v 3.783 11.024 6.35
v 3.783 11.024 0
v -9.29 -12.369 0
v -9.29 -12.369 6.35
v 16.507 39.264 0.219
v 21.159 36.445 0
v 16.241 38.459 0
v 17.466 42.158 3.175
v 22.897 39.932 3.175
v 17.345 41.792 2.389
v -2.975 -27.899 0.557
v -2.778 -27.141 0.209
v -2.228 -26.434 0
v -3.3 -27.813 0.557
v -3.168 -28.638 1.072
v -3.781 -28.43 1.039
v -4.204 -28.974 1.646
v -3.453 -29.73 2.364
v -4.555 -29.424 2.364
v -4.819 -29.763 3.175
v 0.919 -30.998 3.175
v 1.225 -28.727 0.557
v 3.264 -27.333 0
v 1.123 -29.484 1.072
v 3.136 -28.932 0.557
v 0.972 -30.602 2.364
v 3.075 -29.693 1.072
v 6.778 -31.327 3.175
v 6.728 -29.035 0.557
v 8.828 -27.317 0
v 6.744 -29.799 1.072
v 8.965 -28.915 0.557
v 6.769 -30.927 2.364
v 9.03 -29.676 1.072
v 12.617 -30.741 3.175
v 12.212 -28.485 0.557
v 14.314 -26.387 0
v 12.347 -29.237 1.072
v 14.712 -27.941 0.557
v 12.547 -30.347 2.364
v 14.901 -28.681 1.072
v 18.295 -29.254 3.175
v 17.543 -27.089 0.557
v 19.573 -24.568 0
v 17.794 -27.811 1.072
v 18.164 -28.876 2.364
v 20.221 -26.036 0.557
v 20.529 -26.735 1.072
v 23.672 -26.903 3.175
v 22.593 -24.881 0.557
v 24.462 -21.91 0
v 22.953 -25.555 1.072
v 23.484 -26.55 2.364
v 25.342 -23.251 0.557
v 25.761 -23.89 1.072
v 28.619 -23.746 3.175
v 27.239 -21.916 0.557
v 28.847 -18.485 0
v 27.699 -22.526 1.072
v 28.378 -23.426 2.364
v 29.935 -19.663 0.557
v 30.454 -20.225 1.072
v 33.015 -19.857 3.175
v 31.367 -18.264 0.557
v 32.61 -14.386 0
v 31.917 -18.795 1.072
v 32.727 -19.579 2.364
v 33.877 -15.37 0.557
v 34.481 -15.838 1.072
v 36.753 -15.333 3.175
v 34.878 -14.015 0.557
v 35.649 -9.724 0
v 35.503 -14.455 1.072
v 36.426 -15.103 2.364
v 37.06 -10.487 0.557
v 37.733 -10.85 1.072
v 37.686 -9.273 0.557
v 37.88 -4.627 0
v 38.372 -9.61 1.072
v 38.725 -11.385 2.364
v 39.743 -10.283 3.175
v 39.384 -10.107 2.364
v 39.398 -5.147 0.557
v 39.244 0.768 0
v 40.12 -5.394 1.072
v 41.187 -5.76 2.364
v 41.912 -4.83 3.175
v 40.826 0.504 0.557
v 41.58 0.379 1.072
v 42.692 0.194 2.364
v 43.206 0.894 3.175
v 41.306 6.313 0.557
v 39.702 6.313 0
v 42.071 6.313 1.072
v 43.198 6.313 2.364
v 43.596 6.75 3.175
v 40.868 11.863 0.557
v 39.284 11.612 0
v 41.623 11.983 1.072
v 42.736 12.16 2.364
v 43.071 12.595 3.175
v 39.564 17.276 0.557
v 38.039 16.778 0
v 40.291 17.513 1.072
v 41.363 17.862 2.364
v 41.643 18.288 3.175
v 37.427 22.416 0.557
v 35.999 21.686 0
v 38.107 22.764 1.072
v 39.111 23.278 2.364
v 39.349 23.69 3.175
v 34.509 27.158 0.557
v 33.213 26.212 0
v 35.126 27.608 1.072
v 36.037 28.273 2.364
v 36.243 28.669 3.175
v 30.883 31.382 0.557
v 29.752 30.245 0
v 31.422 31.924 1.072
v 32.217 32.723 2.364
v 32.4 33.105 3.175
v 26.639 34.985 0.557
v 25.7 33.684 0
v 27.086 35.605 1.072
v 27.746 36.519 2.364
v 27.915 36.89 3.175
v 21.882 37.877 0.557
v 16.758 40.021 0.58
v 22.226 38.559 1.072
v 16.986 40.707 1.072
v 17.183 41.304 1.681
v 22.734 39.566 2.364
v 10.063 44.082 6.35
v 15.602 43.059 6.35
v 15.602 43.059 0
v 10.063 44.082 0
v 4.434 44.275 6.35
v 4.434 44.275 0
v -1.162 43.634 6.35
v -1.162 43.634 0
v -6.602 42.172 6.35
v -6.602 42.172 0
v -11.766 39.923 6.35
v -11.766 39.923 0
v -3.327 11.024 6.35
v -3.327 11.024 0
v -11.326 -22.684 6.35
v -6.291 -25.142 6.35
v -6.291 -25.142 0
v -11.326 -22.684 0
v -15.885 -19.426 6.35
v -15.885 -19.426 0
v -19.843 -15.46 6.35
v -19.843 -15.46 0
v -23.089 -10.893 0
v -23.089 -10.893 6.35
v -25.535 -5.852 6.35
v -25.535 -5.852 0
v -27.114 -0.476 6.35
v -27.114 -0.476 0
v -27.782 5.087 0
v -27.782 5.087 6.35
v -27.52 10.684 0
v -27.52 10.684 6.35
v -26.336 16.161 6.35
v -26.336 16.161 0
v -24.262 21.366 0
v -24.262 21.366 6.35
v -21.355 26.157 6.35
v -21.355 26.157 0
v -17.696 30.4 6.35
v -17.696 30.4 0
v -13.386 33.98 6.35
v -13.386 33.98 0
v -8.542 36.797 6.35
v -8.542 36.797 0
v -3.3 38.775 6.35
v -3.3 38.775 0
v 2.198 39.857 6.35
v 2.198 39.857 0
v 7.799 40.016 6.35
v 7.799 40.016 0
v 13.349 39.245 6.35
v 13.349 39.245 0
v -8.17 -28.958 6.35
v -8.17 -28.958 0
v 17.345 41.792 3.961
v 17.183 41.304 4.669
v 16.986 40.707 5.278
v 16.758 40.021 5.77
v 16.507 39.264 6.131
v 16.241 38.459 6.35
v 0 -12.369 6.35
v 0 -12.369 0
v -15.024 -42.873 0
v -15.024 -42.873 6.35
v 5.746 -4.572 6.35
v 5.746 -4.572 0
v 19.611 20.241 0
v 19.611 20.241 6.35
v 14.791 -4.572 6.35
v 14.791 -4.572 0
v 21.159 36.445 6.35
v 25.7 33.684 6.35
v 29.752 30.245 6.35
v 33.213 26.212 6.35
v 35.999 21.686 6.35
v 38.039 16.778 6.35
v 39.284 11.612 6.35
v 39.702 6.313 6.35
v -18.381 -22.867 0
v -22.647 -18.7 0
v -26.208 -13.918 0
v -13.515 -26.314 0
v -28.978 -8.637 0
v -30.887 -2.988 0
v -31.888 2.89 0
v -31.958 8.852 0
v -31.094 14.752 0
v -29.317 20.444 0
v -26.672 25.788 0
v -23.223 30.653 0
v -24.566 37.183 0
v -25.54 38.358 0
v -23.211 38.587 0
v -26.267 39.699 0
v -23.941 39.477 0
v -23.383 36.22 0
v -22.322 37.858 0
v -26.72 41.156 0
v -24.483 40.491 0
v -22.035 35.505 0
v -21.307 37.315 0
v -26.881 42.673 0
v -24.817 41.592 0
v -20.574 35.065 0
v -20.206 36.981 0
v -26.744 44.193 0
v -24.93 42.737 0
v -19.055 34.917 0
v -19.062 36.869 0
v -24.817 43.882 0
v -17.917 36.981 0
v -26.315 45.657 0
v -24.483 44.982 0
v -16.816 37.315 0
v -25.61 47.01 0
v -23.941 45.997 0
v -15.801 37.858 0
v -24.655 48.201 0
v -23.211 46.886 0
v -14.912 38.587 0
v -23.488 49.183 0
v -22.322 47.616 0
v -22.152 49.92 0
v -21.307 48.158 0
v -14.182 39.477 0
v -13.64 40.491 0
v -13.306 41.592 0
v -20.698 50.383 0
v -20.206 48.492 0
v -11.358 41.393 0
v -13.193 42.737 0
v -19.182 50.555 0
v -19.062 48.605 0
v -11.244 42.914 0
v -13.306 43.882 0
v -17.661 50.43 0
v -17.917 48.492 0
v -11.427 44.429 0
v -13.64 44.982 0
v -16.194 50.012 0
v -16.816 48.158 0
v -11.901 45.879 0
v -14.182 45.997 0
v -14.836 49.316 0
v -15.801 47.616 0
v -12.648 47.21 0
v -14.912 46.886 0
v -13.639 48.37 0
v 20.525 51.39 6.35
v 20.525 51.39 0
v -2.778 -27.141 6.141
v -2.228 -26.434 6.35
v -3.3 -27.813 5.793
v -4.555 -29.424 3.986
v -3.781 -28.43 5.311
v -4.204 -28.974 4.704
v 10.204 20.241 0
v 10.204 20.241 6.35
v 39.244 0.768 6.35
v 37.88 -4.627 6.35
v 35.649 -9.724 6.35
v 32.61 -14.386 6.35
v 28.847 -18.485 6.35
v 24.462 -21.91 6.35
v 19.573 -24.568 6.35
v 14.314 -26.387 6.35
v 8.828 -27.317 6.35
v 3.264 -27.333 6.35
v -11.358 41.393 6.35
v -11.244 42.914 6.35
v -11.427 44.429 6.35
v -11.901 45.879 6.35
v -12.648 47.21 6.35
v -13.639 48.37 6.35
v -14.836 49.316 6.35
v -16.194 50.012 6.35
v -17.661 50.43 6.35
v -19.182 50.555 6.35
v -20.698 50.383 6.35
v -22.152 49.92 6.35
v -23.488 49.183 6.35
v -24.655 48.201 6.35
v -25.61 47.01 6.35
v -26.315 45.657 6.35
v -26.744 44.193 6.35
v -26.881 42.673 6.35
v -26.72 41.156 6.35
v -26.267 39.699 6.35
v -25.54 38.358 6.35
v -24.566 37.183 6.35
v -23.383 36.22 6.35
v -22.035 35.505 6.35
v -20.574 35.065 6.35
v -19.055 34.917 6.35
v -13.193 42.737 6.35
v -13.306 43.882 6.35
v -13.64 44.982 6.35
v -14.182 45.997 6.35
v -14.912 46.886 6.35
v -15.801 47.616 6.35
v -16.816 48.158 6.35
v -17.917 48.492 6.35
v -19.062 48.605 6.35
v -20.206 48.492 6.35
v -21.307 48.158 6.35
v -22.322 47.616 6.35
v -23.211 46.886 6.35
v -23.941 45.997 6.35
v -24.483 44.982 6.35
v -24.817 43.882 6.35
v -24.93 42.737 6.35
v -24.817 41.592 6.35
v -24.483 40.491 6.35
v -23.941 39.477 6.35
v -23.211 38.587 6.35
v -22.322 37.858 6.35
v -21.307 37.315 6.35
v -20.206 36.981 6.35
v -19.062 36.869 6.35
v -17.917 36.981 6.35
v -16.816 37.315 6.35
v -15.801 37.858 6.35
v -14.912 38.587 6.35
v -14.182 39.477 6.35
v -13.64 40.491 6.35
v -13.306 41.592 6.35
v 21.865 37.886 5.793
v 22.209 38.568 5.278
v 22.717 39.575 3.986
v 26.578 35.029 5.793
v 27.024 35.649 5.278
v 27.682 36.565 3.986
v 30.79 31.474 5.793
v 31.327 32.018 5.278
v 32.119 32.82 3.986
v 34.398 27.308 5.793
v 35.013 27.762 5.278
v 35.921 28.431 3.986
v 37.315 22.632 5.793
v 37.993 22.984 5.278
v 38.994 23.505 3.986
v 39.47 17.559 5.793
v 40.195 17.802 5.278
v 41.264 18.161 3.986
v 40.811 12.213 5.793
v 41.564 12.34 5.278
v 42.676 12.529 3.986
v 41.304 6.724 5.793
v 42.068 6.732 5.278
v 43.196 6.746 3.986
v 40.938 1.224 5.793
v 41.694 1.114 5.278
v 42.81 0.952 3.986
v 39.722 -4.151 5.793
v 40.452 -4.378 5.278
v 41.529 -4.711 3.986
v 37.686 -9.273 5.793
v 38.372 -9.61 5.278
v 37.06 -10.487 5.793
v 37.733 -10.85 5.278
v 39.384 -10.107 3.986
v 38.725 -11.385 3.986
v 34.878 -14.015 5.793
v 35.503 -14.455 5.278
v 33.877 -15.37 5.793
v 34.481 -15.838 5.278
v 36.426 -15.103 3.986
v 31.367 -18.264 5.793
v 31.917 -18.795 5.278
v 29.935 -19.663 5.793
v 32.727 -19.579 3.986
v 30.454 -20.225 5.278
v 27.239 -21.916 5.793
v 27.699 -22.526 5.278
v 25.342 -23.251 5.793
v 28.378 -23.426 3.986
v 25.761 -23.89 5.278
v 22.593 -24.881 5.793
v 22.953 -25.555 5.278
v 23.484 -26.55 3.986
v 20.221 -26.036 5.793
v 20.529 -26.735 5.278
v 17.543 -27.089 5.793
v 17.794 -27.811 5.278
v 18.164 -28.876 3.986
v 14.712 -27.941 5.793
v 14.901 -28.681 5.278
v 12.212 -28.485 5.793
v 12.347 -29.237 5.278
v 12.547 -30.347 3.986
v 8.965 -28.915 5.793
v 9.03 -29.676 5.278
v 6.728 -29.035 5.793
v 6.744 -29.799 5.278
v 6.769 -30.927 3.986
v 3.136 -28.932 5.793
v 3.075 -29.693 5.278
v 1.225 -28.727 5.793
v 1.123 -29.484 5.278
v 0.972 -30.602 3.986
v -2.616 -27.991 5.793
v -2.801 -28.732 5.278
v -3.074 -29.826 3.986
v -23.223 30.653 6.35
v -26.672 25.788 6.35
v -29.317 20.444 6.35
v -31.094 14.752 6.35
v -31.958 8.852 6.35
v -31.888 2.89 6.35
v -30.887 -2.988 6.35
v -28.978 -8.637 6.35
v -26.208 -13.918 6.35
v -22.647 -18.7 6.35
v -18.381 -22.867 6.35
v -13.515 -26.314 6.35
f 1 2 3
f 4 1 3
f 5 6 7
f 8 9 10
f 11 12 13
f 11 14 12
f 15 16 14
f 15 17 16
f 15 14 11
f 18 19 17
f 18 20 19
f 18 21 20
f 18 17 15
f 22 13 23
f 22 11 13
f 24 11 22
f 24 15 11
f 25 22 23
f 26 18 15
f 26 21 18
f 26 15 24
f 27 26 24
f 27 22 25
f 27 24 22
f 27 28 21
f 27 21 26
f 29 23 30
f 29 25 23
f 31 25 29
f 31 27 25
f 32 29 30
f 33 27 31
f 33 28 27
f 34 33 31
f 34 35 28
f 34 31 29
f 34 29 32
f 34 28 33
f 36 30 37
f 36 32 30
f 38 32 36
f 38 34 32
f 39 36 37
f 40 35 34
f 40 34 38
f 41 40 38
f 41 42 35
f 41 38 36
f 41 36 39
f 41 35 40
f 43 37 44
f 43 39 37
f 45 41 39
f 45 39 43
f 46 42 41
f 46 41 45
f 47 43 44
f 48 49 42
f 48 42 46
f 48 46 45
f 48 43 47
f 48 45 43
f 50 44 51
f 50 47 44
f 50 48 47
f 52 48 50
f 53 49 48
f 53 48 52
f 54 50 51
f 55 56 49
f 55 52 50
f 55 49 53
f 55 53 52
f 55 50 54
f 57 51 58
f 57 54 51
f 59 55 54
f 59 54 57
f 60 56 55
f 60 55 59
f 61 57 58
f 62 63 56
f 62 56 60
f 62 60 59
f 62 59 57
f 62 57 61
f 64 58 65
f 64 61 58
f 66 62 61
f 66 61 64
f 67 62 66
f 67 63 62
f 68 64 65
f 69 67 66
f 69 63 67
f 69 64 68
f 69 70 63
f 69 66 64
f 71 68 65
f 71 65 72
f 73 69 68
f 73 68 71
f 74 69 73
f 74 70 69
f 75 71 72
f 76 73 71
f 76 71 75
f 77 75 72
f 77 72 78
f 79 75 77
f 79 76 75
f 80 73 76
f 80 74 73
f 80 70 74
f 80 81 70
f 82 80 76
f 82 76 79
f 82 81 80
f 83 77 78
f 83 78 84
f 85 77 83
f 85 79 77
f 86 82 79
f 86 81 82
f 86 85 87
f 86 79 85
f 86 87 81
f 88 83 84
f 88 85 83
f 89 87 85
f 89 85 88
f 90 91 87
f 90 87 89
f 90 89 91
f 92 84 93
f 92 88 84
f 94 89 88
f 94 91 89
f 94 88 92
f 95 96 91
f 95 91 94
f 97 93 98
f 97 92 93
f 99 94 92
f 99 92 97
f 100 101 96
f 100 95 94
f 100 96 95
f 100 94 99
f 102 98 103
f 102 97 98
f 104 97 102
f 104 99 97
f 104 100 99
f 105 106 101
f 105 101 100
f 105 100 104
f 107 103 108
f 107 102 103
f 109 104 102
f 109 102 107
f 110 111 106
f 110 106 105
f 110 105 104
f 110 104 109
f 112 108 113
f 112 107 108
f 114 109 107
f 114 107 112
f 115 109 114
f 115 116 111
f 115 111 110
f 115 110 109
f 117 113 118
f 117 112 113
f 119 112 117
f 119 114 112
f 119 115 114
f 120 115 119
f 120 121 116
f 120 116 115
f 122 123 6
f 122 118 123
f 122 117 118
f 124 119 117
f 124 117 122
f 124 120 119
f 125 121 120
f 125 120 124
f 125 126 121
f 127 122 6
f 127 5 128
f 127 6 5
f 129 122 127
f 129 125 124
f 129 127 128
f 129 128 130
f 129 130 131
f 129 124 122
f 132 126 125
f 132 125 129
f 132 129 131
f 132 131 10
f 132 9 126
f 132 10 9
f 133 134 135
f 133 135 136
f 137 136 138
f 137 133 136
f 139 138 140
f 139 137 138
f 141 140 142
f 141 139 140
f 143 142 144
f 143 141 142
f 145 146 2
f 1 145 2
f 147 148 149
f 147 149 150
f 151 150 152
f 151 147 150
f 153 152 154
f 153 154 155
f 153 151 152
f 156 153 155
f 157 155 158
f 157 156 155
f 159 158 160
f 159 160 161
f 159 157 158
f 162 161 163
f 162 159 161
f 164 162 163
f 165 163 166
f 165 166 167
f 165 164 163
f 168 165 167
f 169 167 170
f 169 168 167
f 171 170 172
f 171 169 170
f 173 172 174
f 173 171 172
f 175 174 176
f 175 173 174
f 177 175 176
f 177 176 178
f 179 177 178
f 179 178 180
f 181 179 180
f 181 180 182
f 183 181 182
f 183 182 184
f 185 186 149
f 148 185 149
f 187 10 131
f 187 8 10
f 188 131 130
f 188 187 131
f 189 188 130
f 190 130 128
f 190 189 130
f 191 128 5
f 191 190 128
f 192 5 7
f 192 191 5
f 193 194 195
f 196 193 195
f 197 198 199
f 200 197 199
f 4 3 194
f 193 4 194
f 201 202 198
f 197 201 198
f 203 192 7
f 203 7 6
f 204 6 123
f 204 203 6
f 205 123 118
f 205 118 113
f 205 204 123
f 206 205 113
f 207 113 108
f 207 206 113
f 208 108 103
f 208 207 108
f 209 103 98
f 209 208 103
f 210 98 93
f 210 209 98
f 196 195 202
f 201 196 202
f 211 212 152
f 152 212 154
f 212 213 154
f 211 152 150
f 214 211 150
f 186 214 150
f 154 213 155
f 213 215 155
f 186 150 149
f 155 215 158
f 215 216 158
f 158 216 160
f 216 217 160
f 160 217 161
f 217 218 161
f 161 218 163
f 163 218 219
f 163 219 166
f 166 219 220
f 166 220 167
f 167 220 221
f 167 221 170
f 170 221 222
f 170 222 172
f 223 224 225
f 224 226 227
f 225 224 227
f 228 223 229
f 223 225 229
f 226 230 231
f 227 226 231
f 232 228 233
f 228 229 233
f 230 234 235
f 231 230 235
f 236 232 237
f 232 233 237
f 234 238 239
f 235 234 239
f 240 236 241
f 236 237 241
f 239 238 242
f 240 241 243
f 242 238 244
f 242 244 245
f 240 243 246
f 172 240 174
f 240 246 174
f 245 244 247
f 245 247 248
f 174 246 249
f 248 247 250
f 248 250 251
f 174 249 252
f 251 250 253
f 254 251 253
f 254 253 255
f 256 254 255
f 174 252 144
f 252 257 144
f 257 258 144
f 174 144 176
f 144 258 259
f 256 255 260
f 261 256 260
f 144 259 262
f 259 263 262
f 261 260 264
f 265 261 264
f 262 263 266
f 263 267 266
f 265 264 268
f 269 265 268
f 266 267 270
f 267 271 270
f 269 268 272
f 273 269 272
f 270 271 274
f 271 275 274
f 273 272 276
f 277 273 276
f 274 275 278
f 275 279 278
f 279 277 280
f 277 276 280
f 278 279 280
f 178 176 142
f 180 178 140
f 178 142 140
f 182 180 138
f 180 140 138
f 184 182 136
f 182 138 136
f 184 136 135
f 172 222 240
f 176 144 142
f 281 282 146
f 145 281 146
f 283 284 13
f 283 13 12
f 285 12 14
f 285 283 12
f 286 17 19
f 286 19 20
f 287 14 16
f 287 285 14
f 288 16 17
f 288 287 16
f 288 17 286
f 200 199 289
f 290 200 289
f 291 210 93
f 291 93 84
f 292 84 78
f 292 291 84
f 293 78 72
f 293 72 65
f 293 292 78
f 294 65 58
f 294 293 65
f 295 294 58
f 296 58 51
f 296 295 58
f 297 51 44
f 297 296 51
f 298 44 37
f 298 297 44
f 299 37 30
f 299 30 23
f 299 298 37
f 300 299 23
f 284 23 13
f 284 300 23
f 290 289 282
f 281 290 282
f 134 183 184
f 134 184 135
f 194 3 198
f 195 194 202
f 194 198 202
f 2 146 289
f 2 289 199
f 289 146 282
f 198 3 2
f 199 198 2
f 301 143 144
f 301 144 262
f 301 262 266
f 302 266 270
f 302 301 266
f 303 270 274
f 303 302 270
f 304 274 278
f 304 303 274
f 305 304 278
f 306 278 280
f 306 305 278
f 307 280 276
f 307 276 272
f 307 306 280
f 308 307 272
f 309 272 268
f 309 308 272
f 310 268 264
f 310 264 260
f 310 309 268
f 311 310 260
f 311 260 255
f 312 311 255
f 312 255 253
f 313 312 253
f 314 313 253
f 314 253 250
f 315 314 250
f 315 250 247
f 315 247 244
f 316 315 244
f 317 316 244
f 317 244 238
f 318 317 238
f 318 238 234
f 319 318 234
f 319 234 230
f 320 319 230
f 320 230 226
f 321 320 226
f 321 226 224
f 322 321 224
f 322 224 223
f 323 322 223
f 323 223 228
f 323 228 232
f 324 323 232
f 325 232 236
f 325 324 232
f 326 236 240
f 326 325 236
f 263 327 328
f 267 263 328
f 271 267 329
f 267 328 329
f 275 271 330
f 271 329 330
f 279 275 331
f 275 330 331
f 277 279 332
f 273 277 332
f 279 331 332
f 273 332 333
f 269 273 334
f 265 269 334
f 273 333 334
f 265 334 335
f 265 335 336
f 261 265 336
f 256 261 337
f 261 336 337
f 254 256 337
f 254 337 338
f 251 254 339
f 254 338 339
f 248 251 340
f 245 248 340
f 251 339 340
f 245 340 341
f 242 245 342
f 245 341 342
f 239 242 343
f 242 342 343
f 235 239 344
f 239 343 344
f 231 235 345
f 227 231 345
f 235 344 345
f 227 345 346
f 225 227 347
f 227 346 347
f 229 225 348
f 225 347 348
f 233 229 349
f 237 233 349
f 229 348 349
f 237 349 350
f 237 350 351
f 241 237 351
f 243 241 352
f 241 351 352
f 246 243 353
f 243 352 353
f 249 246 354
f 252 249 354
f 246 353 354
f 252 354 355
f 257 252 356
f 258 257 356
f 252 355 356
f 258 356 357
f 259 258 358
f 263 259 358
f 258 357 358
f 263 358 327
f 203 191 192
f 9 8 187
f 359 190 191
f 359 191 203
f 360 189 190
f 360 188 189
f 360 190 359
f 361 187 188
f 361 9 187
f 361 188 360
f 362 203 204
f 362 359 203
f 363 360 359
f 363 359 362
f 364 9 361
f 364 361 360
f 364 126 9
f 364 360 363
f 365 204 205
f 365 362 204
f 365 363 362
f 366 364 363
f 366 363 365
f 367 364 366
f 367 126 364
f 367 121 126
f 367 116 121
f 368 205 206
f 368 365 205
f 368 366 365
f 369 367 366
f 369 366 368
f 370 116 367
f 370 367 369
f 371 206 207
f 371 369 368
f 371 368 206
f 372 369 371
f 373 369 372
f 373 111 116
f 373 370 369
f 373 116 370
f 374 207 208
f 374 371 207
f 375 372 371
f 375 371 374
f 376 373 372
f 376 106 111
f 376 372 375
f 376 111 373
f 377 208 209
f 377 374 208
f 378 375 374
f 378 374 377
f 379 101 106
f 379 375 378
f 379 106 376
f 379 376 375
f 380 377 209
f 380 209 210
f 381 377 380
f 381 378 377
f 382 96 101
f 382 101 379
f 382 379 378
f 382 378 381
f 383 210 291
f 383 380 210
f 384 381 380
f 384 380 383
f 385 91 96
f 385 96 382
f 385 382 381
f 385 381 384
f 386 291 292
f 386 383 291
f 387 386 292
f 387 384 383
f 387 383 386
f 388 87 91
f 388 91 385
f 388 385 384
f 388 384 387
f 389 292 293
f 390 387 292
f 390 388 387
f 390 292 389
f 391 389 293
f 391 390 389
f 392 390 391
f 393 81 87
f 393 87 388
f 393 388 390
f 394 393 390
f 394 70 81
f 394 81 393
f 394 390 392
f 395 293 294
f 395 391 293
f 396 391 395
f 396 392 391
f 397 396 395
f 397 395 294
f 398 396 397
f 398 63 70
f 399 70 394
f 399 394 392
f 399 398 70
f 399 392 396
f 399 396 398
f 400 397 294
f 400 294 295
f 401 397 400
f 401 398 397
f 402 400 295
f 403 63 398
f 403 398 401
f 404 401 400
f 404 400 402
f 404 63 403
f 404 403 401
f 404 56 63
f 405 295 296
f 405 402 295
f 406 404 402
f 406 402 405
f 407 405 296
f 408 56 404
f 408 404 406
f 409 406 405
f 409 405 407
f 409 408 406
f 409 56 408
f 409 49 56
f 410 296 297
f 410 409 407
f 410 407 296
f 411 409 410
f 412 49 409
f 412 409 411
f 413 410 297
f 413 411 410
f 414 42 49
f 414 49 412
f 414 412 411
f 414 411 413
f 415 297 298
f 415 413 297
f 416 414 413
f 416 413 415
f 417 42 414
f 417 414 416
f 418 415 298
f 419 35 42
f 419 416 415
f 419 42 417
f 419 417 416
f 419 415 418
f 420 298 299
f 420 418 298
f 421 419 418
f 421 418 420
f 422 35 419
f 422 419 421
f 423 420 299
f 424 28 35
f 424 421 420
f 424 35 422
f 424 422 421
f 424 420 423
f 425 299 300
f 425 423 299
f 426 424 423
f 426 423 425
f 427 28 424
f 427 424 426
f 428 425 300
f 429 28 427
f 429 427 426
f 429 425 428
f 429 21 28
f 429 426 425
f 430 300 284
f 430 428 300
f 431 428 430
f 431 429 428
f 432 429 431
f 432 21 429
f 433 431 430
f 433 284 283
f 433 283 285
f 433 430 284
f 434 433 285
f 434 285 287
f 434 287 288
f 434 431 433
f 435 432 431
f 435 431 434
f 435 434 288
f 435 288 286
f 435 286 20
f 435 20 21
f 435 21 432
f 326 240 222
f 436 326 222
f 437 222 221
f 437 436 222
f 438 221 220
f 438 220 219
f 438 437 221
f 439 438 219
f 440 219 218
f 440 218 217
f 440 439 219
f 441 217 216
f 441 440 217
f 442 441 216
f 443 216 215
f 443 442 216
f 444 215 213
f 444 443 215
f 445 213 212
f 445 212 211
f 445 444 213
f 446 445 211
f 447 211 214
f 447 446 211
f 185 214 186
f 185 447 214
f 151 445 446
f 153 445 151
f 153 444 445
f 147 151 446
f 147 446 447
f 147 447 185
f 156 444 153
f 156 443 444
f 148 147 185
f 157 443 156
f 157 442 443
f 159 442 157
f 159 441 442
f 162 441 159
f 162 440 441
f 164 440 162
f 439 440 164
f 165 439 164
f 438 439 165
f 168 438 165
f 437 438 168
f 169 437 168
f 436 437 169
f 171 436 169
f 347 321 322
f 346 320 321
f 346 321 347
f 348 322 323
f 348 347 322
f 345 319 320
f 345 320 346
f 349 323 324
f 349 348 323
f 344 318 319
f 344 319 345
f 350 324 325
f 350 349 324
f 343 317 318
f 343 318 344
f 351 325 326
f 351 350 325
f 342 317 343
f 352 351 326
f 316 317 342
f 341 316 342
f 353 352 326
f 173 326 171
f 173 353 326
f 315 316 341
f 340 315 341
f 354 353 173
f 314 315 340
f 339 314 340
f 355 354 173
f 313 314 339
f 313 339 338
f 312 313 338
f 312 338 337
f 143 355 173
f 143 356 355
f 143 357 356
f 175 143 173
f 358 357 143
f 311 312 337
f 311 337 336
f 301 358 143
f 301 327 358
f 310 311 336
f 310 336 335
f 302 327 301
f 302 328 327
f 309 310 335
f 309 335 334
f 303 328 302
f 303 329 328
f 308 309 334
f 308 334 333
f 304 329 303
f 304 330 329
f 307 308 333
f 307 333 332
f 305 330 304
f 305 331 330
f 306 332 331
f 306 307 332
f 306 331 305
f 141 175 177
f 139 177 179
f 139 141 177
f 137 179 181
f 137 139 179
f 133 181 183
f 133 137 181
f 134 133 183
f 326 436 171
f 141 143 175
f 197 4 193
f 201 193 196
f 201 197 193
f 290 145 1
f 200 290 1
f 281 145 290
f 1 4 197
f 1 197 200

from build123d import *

# Parameters (mm, degrees)
F1_DEPTH    = 6.35
F3_DEPTH    = 6.35
F4_R        = 7.8194869238
F4_R_2      = 5.8680689484
F5_DEPTH    = 6.35
F6_T2_ANGLE = 216.8401406518
F6_T4_ANGLE = 216.8401406518


# Not quite as in the source:
# - a fillet or chamfer that OpenCascade refuses, or shapes differently, is made with other operations: its cross-section is extruded or revolved along the edge and cut away or added


with BuildPart() as f1:
    # F0 (on Top) → F1 (new body)
    with BuildSketch(Plane.XY):
        Polygon((10.2044390514, 20.2409497), (20.5251984298, 51.3899475336), (-3.3272264991, 11.0243037343), (3.7826313637, 11.0243037343), (-9.2903310433, -12.3694203794), (0, -12.3694203794), (-15.0240883231, -42.8730025887), (14.7914448753, -4.5715132728), (5.745598625, -4.5715132728), (19.6113856238, 20.2409497), align=None)
    extrude(amount=F1_DEPTH)


with BuildPart() as f3:
    # F2 (on face) → F3 (new body)
    with BuildSketch(Plane.XY.offset(6.35)):
        with BuildLine():
            ThreePointArc((-6.2910568685, -25.142226705), (-26.3355362631, 16.1610780131), (13.3489113778, 39.2454612683))
            Line((13.3489113778, 39.2454612683), (15.6022474373, 43.0587993675))
            ThreePointArc((15.6022474373, 43.0587993675), (-30.1282761074, 18.2224985015), (-8.1703070611, -28.9576903466))
            Line((-8.1703070611, -28.9576903466), (-6.2910568685, -25.142226705))
        make_face()
    extrude(amount=-F3_DEPTH)

    # F4 (on face) → F5 (join)
    with BuildSketch(Plane.XY.offset(6.35)):
        with Locations((-19.0615635365, 42.7367538214)):
            Circle(F4_R)
        with Locations((-19.0615635365, 42.7367538214)):
            Circle(F4_R_2, mode=Mode.SUBTRACT)
    extrude(amount=-F5_DEPTH)


with BuildPart() as f3b:
    # F2 (on face) → F3, piece 2 (new body)
    with BuildSketch(Plane.XY.offset(6.35)):
        with BuildLine():
            ThreePointArc((16.2408188754, 38.4592973202), (33.2131829481, 26.2118953895), (39.7023464178, 6.3133840449))
            ThreePointArc((39.7023464178, 6.3133840449), (26.7251834492, -20.2880192706), (-2.2275902486, -26.4344257227))
            Line((-2.2275902486, -26.4344257227), (-5.0447458233, -30.0533868002))
            ThreePointArc((-5.0447458233, -30.0533868002), (28.5956235275, -24.1914535774), (43.9413588571, 6.3133840449))
            ThreePointArc((43.9413588571, 6.3133840449), (36.6498565452, 28.693610287), (17.57413441, 42.4833658191))
            Line((17.57413441, 42.4833658191), (16.2408188754, 38.4592973202))
        make_face()
    extrude(amount=-F3_DEPTH)

    # F6: fillet of radius 5.08 on 2 edges, made by hand

    # F6_s1 → F6_t2 (revolve, cut)
    with BuildSketch(Plane(origin=(6.0682659835, 0.1166447559, 0), x_dir=(0, 0, 1), z_dir=(-0.9998153068, -0.01921854, 0))):
        with BuildLine():
            ThreePointArc((6.35, 39.9510787116), (4.6214204879, 42.98814587), (1.340095817, 44.190091151))
            Line((1.340095817, 44.190091151), (6.35, 44.190091151))
            Line((6.35, 44.190091151), (6.35, 39.9510787116))
        make_face()
    revolve(axis=Axis((5.9491517022, 6.3133840449, 6.35), (0, 0, -1)), revolution_arc=F6_T2_ANGLE, mode=Mode.SUBTRACT)

    # F6_s3 → F6_t4 (revolve, cut)
    with BuildSketch(Plane(origin=(0.9263339106, -0.6665933412, 0), x_dir=(0, 0, 1), z_dir=(-0.8116868319, 0.5840928752, 0))):
        with BuildLine():
            ThreePointArc((0, -25.1538468985), (1.7285795121, -28.1909140569), (5.009904183, -29.3928593379))
            Line((5.009904183, -29.3928593379), (0, -29.3928593379))
            Line((0, -29.3928593379), (0, -25.1538468985))
        make_face()
    revolve(axis=Axis((5.9491517022, 6.3133840449, 0), (0, 0, 1)), revolution_arc=F6_T4_ANGLE, mode=Mode.SUBTRACT)


solid = Compound([f1.part, f3.part, f3b.part])
